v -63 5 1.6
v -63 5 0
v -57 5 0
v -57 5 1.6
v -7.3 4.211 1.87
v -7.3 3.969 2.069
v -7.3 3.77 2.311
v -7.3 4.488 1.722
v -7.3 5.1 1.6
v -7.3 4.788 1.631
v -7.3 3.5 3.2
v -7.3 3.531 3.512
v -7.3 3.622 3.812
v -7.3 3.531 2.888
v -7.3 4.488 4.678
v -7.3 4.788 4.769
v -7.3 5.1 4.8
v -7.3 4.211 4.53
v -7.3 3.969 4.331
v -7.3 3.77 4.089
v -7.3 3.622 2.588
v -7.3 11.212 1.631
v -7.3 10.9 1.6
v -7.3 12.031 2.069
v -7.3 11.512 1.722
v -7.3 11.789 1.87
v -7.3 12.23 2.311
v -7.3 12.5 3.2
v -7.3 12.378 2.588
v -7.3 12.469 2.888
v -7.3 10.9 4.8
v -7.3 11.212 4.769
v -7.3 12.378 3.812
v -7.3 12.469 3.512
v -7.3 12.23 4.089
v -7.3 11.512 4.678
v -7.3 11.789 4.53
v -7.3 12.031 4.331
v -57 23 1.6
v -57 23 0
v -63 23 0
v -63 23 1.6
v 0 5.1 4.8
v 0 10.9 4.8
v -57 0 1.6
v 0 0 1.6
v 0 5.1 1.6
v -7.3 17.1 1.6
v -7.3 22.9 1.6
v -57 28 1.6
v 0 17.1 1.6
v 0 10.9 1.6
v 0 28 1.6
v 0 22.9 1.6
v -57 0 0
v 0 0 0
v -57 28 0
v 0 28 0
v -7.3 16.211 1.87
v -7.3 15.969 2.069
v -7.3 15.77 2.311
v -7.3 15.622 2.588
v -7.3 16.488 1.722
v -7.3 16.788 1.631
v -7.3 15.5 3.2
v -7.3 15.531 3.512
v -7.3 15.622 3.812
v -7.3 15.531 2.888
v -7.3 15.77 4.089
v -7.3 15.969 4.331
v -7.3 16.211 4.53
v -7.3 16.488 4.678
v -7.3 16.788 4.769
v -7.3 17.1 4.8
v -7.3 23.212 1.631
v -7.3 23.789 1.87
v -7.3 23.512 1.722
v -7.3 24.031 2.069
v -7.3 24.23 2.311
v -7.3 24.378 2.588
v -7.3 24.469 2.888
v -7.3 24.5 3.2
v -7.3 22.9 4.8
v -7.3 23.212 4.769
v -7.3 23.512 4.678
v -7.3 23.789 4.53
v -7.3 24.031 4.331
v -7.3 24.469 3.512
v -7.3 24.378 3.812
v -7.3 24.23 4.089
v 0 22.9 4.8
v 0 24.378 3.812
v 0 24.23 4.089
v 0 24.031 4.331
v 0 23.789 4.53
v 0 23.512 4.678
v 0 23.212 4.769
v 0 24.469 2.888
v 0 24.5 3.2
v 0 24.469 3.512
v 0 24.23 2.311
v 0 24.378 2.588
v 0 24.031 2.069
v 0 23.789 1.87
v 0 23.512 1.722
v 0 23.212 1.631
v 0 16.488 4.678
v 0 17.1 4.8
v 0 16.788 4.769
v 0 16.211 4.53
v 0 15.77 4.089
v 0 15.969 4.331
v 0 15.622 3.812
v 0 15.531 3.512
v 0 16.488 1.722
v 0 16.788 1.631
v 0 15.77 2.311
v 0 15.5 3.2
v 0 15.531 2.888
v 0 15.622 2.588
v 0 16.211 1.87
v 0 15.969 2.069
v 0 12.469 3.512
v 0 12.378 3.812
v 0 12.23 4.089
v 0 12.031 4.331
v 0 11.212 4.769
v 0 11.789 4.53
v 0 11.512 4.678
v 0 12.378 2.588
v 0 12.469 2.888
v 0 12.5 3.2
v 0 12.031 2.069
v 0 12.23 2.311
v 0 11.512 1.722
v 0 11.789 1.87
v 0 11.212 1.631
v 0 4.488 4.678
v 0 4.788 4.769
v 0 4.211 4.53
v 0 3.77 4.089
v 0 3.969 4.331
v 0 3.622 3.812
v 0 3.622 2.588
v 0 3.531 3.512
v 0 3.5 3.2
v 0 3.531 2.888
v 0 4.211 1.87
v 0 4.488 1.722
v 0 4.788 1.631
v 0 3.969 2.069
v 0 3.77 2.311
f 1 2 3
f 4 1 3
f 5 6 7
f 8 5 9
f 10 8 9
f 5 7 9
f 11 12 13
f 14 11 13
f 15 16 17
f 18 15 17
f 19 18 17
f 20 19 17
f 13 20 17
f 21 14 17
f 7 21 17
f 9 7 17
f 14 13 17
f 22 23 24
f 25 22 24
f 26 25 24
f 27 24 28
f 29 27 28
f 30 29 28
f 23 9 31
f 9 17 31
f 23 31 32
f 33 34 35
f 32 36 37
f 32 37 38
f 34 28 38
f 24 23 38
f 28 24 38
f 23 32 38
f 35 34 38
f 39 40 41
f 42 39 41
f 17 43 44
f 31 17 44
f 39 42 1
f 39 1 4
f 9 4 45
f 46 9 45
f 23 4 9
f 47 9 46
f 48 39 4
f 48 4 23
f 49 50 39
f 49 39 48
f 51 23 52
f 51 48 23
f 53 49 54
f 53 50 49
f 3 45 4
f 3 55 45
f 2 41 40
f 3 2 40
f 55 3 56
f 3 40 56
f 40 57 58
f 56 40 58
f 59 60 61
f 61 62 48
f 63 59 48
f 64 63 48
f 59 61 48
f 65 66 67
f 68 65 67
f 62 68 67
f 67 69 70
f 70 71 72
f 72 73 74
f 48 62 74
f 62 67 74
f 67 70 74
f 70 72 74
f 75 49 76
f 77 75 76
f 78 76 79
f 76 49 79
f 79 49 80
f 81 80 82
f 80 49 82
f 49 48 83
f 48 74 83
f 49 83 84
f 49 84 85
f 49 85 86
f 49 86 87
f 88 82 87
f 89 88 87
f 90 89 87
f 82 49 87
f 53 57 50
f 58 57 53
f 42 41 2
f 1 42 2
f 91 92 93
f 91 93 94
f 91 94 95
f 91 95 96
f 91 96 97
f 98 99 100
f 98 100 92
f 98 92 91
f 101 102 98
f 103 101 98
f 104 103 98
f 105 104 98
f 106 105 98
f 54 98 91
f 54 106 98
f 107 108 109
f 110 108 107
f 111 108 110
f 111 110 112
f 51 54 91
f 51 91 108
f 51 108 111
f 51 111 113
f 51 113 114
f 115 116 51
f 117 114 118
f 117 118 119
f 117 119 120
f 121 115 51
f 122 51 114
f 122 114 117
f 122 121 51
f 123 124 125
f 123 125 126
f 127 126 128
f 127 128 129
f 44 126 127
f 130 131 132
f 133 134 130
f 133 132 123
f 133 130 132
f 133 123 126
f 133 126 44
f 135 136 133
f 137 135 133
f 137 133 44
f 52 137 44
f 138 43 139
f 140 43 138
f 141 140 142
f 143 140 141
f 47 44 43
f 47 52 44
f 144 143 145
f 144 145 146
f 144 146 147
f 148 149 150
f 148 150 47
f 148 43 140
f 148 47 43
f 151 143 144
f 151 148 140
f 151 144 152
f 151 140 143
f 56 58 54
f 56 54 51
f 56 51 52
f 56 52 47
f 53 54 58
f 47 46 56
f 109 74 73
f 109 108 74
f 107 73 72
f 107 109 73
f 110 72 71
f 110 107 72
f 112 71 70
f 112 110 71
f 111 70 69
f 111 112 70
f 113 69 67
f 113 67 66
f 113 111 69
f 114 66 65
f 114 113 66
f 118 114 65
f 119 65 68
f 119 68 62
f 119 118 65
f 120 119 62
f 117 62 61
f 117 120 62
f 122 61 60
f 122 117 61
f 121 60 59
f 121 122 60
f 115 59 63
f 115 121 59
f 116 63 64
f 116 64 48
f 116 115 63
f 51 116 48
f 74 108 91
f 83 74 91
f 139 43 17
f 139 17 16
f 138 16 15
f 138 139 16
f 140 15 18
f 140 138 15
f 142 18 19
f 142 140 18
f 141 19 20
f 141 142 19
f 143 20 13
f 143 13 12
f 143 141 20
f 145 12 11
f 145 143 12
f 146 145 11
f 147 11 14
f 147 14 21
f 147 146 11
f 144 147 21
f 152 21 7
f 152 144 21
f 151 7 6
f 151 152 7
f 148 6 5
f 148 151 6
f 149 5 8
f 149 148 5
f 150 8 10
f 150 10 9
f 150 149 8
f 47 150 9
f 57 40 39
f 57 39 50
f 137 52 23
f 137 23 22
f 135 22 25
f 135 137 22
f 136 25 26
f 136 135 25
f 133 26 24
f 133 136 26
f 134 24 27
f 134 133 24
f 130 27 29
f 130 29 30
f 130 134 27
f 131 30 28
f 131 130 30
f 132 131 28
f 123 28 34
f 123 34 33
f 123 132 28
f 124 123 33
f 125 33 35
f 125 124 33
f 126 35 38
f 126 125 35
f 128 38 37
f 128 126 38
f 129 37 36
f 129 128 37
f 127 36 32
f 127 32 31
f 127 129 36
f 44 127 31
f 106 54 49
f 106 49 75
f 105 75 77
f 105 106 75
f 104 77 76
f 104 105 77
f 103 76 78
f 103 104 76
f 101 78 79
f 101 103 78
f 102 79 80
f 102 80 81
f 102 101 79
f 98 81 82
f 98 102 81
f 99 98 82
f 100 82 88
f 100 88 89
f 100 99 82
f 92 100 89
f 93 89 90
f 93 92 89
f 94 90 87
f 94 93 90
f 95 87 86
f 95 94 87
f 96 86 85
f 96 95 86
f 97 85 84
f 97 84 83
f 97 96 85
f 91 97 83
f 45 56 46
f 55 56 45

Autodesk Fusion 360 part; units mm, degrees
sketch "Skizze1" plane through (0, 0, 0) normal (0, 0, 1) x (1, 0, 0)
  line L0 (0, 0) -> (-57, 0)
  line L1 (-57, 0) -> (-57, 28)
  line L2 (-57, 28) -> (0, 28)
  line L3 (0, 28) -> (0, 0)
  line L4 (-57, 23) -> (-63, 23)
  line L5 (-63, 23) -> (-63, 5)
  line L6 (-63, 5) -> (-57, 5)
  line L7 (-57, 5) -> (-57, 23)
  line L8 (0, 14) -> (-57, 14) construction
  dimension "d1" = 57
  dimension "d2" = 28
  dimension "d3" = 6
  dimension "d4" = 18
extrude "Extrusion1" add sketch "Skizze1" along normal blind 1.6
sketch "Skizze2" plane through (0, 0, 0) normal (1, 0, 0) x (0, 1, 0)
  line L0 (0, 0) -> (28, 0)
  line L1 (28, 0) -> (28, 1.6)
  line L2 (28, 1.6) -> (0, 1.6)
  line L3 (0, 1.6) -> (0, 0)
  line L4 (23, 1.6) -> (5, 1.6)
  line L5 (5, 1.6) -> (0, 1.6)
  line L6 (0, 1.6) -> (28, 1.6)
  line L7 (28, 1.6) -> (23, 1.6)
  line L8 (5.1, 4.8) -> (10.9, 4.8)
  line L9 (10.9, 1.6) -> (5.1, 1.6)
  line L10 (17.1, 4.8) -> (22.9, 4.8)
  line L11 (17.1, 1.6) -> (22.9, 1.6)
  arc A0 (5.1, 4.8) -> (5.1, 1.6) centre (5.1, 3.2) ccw
  arc A1 (10.9, 1.6) -> (10.9, 4.8) centre (10.9, 3.2) ccw
  arc A2 (17.1, 4.8) -> (17.1, 1.6) centre (17.1, 3.2) ccw
  arc A3 (22.9, 1.6) -> (22.9, 4.8) centre (22.9, 3.2) ccw
  line L12 (14, 1.6) -> (14, 0) construction
  dimension "d7" = 3.2
  dimension "d8" = 3.2
  dimension "d9" = 5.8
  dimension "d10" = 5.8
  dimension "d11" = 6.2
extrude "Extrusion2" add sketch "Skizze2" against normal blind 7.3 contours L2 L4 L6 L8 L9 A0 A1 | L2 L4 L6 L10 L11 A2 A3
sketch "Skizze3" plane through (0, 0, 0) normal (0, 0, -1) x (1, 0, 0)
  line L0 (-63, -23) -> (-57, -23)
  line L1 (-57, -23) -> (-57, -28)
  line L2 (-57, -28) -> (0, -28)
  line L3 (0, -28) -> (0, 0)
  line L4 (0, 0) -> (-57, 0)
  line L5 (-57, 0) -> (-57, -5)
  line L6 (-57, -5) -> (-63, -5)
  line L7 (-63, -5) -> (-63, -23)
  line L8 (0, -26.7) -> (-57, -26.7) construction
  line L9 (0, -1.3) -> (-57, -1.3) construction
  line L10 (-1.83, -26.7) -> (-1.83, -1.3) construction
  line L11 (-55.17, -26.7) -> (-55.17, -1.3) construction
  line L12 (-1.83, -26.7) -> (0, -26.7) construction
  line L13 (-57, -26.7) -> (-55.17, -26.7) construction
  line L14 (0, -14) -> (-63, -14) construction
  point P0 (-1.83, -1.3)
  point P1 (-55.17, -1.3)
  point P2 (-55.17, -26.7)
  point P3 (-1.83, -26.7)
  dimension "d14" = 53.34
  dimension "d16" = 25.4
equation "d8 = d7"
equation "d9 = d10"
equation "d10 = 9 mm - 3.2 mm"
equation "d11 = 3 mm + 3.2 mm"
equation "d14 = ( 21 * 2.54 ) * 1 mm"
equation "d16 = ( 10 * 2.54 ) * 1 mm"
